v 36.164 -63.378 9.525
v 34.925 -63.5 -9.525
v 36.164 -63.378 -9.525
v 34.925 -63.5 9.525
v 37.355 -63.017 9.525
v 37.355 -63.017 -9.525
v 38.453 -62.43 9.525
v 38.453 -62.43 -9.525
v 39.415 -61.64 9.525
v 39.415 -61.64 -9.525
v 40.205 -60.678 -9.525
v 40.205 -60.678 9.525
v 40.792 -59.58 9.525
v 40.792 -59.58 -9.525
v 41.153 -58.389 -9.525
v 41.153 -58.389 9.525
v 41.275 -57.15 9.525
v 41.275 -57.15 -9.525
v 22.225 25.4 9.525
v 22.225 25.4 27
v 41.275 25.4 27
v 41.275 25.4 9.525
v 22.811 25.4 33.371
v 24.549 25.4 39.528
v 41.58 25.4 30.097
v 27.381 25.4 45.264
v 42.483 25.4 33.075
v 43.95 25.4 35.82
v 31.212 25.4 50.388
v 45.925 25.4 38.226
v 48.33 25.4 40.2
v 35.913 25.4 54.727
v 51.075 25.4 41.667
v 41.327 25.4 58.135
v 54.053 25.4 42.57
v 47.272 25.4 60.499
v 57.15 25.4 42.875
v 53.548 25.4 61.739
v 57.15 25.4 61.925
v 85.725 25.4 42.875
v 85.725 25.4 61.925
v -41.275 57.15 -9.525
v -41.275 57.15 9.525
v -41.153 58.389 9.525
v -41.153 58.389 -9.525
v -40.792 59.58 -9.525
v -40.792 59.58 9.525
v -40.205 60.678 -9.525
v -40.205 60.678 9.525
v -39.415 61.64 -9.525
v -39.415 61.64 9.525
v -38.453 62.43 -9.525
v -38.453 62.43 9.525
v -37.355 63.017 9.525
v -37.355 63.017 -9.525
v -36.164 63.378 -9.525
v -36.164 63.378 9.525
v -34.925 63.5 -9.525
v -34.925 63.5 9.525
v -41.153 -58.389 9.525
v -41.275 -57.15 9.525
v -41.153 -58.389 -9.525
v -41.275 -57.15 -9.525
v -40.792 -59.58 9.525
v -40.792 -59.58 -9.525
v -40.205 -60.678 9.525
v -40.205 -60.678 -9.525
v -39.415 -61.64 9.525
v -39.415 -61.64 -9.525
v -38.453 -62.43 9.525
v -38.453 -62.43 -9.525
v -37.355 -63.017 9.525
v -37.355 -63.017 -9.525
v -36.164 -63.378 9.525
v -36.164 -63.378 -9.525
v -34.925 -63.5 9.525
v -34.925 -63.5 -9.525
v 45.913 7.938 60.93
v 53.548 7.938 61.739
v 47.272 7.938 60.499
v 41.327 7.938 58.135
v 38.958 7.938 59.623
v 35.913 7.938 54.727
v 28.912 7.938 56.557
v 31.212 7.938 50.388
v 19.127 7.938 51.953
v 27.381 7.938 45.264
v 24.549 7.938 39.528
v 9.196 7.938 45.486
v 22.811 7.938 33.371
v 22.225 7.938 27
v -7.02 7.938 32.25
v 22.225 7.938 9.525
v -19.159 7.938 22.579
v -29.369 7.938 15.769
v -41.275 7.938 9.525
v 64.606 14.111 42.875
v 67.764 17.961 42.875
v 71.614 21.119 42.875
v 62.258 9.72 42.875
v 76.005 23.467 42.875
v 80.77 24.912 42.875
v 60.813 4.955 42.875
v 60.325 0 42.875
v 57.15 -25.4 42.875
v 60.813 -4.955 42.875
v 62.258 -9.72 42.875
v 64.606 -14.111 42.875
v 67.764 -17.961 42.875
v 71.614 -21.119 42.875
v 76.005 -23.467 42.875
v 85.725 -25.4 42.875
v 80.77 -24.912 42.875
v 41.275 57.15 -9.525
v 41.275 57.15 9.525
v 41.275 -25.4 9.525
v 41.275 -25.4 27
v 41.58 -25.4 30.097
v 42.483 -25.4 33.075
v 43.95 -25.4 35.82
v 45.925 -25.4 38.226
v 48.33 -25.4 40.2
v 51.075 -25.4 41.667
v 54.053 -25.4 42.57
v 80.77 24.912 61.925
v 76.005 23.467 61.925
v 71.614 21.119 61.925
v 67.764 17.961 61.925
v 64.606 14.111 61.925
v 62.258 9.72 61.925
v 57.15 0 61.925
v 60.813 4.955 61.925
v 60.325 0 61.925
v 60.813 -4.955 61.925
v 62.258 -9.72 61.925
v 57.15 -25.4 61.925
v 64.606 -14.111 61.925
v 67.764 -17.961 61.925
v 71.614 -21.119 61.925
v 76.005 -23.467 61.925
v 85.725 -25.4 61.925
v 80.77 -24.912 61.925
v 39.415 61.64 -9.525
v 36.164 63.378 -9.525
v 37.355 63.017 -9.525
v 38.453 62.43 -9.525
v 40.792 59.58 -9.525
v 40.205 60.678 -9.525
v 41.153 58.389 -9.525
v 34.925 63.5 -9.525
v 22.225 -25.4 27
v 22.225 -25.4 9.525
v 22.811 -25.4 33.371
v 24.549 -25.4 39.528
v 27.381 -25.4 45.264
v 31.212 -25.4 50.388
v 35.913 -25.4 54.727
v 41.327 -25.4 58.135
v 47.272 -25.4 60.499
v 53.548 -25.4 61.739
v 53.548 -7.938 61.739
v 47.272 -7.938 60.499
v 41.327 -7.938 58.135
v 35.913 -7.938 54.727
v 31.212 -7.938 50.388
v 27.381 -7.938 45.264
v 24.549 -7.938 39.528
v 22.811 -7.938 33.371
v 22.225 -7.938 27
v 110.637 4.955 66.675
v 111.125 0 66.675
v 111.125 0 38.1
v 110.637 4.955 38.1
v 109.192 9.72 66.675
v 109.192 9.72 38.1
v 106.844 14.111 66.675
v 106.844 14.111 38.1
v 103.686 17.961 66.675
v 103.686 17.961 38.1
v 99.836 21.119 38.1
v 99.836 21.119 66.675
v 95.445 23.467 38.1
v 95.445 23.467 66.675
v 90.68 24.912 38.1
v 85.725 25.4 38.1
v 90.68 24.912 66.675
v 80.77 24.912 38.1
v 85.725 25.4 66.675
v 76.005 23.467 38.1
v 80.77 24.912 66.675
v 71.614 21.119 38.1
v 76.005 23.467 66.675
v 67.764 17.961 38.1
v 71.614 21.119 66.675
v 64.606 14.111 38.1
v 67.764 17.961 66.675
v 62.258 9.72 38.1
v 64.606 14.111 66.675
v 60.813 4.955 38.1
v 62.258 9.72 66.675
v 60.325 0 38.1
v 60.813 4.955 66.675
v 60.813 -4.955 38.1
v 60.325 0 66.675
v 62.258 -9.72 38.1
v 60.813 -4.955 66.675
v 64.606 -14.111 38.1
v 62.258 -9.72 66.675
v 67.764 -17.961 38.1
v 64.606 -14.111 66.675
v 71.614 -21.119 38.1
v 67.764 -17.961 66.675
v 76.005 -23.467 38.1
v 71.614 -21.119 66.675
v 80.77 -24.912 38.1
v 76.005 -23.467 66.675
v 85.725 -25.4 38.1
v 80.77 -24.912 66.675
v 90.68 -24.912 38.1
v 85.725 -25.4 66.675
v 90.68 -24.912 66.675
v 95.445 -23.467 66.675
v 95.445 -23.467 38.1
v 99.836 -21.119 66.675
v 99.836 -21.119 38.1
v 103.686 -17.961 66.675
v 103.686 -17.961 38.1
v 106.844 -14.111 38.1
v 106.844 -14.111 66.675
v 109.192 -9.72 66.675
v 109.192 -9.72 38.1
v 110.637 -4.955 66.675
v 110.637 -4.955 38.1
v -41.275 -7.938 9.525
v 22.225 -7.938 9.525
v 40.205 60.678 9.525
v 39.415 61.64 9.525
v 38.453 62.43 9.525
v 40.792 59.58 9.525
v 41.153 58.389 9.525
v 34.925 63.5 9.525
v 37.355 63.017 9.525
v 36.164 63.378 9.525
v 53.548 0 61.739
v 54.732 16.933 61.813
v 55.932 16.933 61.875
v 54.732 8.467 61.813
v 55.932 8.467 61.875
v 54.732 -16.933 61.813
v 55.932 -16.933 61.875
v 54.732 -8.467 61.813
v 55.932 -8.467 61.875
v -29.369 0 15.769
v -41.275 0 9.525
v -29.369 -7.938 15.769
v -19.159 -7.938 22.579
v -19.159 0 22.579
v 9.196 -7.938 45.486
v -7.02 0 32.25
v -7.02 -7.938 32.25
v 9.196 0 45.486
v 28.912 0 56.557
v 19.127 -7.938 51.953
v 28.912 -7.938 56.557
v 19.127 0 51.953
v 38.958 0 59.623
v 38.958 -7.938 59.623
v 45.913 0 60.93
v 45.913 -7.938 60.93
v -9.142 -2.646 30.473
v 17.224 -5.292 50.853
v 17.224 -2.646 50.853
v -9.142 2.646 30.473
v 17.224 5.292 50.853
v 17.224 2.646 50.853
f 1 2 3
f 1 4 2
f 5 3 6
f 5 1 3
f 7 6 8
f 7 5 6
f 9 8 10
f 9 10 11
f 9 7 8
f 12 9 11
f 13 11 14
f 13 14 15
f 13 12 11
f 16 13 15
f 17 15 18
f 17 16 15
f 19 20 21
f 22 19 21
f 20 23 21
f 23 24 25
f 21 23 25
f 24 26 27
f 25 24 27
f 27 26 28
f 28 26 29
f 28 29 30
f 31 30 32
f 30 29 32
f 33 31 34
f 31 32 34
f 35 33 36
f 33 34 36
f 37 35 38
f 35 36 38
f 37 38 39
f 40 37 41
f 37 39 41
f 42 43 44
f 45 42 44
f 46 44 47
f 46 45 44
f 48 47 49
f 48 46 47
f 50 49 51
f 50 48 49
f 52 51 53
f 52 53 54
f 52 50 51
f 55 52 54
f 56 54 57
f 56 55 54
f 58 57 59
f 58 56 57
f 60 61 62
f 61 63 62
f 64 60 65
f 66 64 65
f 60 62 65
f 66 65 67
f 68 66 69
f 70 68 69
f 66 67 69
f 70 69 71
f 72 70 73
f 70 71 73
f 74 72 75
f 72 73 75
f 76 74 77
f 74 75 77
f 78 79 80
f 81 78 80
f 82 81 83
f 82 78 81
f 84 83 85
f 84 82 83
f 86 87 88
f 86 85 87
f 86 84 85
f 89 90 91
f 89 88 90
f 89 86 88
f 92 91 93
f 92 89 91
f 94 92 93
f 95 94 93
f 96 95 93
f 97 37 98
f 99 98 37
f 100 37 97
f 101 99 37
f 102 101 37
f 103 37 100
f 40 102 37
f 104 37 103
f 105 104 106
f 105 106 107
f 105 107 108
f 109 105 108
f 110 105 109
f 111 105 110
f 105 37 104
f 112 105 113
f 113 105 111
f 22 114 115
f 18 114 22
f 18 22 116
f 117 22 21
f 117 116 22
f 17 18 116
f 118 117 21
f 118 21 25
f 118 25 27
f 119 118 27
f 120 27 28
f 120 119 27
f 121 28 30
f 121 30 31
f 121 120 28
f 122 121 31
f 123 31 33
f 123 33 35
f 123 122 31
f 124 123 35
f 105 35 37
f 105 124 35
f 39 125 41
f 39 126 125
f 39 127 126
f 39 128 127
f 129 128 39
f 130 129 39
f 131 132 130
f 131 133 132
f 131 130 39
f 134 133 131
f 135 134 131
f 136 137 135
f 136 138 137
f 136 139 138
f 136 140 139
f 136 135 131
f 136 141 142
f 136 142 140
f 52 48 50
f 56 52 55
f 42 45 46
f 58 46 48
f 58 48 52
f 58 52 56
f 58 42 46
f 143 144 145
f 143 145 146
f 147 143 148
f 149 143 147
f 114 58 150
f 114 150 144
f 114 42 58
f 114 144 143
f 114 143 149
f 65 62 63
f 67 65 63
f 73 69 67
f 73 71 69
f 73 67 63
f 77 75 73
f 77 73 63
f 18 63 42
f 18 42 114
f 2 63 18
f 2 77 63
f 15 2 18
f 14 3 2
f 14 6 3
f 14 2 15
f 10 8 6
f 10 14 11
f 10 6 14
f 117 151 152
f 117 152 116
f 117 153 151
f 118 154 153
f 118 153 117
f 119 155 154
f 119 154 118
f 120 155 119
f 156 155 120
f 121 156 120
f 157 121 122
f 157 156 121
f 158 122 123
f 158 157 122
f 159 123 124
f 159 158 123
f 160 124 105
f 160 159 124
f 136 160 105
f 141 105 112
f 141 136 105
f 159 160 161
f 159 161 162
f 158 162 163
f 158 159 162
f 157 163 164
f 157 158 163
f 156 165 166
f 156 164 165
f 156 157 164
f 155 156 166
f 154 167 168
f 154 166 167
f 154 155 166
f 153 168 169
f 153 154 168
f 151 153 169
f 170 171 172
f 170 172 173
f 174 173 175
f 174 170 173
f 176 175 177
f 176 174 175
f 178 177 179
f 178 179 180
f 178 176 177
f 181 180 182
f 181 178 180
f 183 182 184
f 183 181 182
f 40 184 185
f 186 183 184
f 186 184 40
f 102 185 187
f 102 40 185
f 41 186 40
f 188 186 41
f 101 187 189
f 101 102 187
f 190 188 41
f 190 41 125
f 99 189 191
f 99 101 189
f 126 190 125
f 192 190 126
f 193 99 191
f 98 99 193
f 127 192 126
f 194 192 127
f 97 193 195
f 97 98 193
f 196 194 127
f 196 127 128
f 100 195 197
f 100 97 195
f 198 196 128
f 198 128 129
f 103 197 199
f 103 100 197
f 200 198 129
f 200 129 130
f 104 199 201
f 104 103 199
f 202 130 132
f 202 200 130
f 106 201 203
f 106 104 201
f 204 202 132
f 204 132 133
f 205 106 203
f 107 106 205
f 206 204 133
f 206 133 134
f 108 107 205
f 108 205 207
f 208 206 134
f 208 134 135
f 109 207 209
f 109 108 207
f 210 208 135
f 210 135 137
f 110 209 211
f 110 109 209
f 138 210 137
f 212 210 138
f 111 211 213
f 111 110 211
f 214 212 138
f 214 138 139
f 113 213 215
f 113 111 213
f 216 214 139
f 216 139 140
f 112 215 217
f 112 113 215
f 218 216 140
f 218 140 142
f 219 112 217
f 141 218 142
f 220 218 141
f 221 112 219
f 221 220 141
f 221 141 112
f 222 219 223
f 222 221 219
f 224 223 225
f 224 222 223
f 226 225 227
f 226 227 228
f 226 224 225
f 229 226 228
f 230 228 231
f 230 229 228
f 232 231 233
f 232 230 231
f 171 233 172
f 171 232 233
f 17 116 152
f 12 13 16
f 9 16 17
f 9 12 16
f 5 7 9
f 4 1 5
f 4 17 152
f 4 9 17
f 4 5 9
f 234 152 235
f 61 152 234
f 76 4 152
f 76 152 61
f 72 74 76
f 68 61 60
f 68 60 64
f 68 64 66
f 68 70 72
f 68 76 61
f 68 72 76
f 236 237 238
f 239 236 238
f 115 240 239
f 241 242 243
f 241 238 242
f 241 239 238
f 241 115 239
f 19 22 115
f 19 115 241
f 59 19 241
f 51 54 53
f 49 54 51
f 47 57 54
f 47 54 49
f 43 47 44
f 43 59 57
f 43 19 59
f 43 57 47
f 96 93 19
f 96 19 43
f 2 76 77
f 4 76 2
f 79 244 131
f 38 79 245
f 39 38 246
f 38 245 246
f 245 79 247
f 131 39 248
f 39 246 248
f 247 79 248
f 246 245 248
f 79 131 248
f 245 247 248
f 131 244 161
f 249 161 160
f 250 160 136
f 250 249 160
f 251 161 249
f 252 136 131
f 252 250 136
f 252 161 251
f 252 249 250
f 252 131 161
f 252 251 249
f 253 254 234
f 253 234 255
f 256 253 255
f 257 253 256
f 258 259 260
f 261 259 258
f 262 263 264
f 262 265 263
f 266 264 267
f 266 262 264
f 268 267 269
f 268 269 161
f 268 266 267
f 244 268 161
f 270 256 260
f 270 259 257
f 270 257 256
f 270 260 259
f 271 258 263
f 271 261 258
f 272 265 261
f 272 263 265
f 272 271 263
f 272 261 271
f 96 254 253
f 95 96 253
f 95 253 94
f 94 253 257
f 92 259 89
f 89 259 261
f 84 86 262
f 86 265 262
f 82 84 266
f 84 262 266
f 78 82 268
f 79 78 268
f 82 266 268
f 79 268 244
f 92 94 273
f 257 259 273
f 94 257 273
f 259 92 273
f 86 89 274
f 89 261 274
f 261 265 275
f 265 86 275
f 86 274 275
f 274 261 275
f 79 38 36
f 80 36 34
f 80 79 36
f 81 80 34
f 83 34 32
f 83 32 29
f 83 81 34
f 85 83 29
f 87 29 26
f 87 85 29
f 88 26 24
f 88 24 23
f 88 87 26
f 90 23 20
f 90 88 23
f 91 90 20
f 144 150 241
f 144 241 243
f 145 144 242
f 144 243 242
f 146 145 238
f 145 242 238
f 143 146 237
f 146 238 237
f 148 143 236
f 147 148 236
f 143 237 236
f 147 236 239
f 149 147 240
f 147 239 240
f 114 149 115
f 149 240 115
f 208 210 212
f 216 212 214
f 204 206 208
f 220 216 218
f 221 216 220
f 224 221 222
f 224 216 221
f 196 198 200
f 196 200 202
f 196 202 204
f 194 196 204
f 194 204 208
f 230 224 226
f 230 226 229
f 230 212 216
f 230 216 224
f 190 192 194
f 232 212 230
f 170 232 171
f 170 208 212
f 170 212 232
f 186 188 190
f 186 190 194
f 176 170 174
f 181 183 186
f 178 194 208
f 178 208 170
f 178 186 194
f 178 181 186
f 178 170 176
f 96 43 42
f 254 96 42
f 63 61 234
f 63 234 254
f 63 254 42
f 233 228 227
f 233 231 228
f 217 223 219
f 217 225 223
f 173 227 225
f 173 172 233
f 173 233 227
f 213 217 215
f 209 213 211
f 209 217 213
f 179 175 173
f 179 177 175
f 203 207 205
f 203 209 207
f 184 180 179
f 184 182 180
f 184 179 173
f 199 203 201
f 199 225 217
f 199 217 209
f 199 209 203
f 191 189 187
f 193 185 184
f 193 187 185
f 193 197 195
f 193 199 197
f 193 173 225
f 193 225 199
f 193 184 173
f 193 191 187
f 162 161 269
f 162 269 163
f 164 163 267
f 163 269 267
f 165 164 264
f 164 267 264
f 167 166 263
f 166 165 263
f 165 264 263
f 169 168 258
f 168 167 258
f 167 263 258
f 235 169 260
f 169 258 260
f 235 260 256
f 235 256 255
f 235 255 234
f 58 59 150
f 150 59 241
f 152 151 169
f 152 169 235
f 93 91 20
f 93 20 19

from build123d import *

# Parameters (mm, degrees)
F1_DEPTH = 63.5
F0_W     = 25.4
F0_H     = 19.05
F2_DEPTH = 25.4
F3_DEPTH = 7.9375
F4_R     = 6.35


with BuildPart() as f1:
    # F0 (on Front) → F1 (new body, symmetric)
    with BuildSketch(Plane.XZ):
        Polygon((22.225, 9.525), (-41.275, 9.525), (-41.275, -9.525), (41.275, -9.525), (41.275, 9.525), align=None)
    extrude(amount=F1_DEPTH, both=True)

    # F0 (on Front) → F2 (join, symmetric)
    with BuildSketch(Plane.XZ):
        with BuildLine():
            Line((22.225, 27.0002), (22.225, 9.525))
            Line((22.225, 9.525), (41.275, 9.525))
            Line((41.275, 9.525), (41.275, 27.0002))
            ThreePointArc((41.275, 27.0002), (45.9246798487, 38.2255201513), (57.15, 42.8752))
            Line((57.15, 42.8752), (60.325, 42.8752))
            Line((60.325, 42.8752), (60.325, 61.9252))
            Line((60.325, 61.9252), (57.15, 61.9252))
            add(Edge.make_bspline(
                [(53.5478773924, 61.7389440435), (54.7236223027, 61.8188750889), (55.923949642, 61.8811762152), (57.15, 61.9252)],
                knots=[108.7572829366, 108.7572829366, 108.7572829366, 108.7572829366, 111.5045361635, 111.5045361635, 111.5045361635, 111.5045361635], degree=3))
            ThreePointArc((53.5478773924, 61.7389440435), (31.2119993343, 50.3877126182), (22.225, 27.0002))
        make_face()
        with Locations((73.025, 52.4002)):
            Rectangle(F0_W, F0_H)
    extrude(amount=F2_DEPTH, both=True)

    # F0 (on Front) → F3 (join, symmetric)
    with BuildSketch(Plane.XZ):
        with BuildLine():
            add(Edge.make_bspline(
                [(-41.275, 9.525), (-1.0169351027, 27.7810963439), (7.0029063578, 58.5746622675), (53.5478773924, 61.7389440435)],
                knots=[0, 0, 0, 0, 108.7572829366, 108.7572829366, 108.7572829366, 108.7572829366], degree=3))
            Line((-41.275, 9.525), (22.225, 9.525))
            Line((22.225, 9.525), (22.225, 27.0002))
            ThreePointArc((22.225, 27.0002), (31.2119993343, 50.3877126182), (53.5478773924, 61.7389440435))
        make_face()
    extrude(amount=F3_DEPTH, both=True)

    # F4
    f4_edges = [f1.edges().sort_by_distance(p)[0] for p in [
        (-41.275, -63.5, 0),
        (41.275, -63.5, 0),
        (41.275, 63.5, 0),
        (-41.275, 63.5, 0),
    ]]
    fillet(f4_edges, radius=F4_R)

    # F0 (on Front) → F5 (revolve)
    with BuildSketch(Plane.XZ):
        Polygon((85.725, 66.675), (85.725, 61.9252), (85.725, 42.8752), (85.725, 38.1), (111.125, 38.1), (111.125, 66.675), align=None)
    revolve(axis=Axis((85.725, 0, 52.3875), (0, 0, 1)))


solid = f1.part
